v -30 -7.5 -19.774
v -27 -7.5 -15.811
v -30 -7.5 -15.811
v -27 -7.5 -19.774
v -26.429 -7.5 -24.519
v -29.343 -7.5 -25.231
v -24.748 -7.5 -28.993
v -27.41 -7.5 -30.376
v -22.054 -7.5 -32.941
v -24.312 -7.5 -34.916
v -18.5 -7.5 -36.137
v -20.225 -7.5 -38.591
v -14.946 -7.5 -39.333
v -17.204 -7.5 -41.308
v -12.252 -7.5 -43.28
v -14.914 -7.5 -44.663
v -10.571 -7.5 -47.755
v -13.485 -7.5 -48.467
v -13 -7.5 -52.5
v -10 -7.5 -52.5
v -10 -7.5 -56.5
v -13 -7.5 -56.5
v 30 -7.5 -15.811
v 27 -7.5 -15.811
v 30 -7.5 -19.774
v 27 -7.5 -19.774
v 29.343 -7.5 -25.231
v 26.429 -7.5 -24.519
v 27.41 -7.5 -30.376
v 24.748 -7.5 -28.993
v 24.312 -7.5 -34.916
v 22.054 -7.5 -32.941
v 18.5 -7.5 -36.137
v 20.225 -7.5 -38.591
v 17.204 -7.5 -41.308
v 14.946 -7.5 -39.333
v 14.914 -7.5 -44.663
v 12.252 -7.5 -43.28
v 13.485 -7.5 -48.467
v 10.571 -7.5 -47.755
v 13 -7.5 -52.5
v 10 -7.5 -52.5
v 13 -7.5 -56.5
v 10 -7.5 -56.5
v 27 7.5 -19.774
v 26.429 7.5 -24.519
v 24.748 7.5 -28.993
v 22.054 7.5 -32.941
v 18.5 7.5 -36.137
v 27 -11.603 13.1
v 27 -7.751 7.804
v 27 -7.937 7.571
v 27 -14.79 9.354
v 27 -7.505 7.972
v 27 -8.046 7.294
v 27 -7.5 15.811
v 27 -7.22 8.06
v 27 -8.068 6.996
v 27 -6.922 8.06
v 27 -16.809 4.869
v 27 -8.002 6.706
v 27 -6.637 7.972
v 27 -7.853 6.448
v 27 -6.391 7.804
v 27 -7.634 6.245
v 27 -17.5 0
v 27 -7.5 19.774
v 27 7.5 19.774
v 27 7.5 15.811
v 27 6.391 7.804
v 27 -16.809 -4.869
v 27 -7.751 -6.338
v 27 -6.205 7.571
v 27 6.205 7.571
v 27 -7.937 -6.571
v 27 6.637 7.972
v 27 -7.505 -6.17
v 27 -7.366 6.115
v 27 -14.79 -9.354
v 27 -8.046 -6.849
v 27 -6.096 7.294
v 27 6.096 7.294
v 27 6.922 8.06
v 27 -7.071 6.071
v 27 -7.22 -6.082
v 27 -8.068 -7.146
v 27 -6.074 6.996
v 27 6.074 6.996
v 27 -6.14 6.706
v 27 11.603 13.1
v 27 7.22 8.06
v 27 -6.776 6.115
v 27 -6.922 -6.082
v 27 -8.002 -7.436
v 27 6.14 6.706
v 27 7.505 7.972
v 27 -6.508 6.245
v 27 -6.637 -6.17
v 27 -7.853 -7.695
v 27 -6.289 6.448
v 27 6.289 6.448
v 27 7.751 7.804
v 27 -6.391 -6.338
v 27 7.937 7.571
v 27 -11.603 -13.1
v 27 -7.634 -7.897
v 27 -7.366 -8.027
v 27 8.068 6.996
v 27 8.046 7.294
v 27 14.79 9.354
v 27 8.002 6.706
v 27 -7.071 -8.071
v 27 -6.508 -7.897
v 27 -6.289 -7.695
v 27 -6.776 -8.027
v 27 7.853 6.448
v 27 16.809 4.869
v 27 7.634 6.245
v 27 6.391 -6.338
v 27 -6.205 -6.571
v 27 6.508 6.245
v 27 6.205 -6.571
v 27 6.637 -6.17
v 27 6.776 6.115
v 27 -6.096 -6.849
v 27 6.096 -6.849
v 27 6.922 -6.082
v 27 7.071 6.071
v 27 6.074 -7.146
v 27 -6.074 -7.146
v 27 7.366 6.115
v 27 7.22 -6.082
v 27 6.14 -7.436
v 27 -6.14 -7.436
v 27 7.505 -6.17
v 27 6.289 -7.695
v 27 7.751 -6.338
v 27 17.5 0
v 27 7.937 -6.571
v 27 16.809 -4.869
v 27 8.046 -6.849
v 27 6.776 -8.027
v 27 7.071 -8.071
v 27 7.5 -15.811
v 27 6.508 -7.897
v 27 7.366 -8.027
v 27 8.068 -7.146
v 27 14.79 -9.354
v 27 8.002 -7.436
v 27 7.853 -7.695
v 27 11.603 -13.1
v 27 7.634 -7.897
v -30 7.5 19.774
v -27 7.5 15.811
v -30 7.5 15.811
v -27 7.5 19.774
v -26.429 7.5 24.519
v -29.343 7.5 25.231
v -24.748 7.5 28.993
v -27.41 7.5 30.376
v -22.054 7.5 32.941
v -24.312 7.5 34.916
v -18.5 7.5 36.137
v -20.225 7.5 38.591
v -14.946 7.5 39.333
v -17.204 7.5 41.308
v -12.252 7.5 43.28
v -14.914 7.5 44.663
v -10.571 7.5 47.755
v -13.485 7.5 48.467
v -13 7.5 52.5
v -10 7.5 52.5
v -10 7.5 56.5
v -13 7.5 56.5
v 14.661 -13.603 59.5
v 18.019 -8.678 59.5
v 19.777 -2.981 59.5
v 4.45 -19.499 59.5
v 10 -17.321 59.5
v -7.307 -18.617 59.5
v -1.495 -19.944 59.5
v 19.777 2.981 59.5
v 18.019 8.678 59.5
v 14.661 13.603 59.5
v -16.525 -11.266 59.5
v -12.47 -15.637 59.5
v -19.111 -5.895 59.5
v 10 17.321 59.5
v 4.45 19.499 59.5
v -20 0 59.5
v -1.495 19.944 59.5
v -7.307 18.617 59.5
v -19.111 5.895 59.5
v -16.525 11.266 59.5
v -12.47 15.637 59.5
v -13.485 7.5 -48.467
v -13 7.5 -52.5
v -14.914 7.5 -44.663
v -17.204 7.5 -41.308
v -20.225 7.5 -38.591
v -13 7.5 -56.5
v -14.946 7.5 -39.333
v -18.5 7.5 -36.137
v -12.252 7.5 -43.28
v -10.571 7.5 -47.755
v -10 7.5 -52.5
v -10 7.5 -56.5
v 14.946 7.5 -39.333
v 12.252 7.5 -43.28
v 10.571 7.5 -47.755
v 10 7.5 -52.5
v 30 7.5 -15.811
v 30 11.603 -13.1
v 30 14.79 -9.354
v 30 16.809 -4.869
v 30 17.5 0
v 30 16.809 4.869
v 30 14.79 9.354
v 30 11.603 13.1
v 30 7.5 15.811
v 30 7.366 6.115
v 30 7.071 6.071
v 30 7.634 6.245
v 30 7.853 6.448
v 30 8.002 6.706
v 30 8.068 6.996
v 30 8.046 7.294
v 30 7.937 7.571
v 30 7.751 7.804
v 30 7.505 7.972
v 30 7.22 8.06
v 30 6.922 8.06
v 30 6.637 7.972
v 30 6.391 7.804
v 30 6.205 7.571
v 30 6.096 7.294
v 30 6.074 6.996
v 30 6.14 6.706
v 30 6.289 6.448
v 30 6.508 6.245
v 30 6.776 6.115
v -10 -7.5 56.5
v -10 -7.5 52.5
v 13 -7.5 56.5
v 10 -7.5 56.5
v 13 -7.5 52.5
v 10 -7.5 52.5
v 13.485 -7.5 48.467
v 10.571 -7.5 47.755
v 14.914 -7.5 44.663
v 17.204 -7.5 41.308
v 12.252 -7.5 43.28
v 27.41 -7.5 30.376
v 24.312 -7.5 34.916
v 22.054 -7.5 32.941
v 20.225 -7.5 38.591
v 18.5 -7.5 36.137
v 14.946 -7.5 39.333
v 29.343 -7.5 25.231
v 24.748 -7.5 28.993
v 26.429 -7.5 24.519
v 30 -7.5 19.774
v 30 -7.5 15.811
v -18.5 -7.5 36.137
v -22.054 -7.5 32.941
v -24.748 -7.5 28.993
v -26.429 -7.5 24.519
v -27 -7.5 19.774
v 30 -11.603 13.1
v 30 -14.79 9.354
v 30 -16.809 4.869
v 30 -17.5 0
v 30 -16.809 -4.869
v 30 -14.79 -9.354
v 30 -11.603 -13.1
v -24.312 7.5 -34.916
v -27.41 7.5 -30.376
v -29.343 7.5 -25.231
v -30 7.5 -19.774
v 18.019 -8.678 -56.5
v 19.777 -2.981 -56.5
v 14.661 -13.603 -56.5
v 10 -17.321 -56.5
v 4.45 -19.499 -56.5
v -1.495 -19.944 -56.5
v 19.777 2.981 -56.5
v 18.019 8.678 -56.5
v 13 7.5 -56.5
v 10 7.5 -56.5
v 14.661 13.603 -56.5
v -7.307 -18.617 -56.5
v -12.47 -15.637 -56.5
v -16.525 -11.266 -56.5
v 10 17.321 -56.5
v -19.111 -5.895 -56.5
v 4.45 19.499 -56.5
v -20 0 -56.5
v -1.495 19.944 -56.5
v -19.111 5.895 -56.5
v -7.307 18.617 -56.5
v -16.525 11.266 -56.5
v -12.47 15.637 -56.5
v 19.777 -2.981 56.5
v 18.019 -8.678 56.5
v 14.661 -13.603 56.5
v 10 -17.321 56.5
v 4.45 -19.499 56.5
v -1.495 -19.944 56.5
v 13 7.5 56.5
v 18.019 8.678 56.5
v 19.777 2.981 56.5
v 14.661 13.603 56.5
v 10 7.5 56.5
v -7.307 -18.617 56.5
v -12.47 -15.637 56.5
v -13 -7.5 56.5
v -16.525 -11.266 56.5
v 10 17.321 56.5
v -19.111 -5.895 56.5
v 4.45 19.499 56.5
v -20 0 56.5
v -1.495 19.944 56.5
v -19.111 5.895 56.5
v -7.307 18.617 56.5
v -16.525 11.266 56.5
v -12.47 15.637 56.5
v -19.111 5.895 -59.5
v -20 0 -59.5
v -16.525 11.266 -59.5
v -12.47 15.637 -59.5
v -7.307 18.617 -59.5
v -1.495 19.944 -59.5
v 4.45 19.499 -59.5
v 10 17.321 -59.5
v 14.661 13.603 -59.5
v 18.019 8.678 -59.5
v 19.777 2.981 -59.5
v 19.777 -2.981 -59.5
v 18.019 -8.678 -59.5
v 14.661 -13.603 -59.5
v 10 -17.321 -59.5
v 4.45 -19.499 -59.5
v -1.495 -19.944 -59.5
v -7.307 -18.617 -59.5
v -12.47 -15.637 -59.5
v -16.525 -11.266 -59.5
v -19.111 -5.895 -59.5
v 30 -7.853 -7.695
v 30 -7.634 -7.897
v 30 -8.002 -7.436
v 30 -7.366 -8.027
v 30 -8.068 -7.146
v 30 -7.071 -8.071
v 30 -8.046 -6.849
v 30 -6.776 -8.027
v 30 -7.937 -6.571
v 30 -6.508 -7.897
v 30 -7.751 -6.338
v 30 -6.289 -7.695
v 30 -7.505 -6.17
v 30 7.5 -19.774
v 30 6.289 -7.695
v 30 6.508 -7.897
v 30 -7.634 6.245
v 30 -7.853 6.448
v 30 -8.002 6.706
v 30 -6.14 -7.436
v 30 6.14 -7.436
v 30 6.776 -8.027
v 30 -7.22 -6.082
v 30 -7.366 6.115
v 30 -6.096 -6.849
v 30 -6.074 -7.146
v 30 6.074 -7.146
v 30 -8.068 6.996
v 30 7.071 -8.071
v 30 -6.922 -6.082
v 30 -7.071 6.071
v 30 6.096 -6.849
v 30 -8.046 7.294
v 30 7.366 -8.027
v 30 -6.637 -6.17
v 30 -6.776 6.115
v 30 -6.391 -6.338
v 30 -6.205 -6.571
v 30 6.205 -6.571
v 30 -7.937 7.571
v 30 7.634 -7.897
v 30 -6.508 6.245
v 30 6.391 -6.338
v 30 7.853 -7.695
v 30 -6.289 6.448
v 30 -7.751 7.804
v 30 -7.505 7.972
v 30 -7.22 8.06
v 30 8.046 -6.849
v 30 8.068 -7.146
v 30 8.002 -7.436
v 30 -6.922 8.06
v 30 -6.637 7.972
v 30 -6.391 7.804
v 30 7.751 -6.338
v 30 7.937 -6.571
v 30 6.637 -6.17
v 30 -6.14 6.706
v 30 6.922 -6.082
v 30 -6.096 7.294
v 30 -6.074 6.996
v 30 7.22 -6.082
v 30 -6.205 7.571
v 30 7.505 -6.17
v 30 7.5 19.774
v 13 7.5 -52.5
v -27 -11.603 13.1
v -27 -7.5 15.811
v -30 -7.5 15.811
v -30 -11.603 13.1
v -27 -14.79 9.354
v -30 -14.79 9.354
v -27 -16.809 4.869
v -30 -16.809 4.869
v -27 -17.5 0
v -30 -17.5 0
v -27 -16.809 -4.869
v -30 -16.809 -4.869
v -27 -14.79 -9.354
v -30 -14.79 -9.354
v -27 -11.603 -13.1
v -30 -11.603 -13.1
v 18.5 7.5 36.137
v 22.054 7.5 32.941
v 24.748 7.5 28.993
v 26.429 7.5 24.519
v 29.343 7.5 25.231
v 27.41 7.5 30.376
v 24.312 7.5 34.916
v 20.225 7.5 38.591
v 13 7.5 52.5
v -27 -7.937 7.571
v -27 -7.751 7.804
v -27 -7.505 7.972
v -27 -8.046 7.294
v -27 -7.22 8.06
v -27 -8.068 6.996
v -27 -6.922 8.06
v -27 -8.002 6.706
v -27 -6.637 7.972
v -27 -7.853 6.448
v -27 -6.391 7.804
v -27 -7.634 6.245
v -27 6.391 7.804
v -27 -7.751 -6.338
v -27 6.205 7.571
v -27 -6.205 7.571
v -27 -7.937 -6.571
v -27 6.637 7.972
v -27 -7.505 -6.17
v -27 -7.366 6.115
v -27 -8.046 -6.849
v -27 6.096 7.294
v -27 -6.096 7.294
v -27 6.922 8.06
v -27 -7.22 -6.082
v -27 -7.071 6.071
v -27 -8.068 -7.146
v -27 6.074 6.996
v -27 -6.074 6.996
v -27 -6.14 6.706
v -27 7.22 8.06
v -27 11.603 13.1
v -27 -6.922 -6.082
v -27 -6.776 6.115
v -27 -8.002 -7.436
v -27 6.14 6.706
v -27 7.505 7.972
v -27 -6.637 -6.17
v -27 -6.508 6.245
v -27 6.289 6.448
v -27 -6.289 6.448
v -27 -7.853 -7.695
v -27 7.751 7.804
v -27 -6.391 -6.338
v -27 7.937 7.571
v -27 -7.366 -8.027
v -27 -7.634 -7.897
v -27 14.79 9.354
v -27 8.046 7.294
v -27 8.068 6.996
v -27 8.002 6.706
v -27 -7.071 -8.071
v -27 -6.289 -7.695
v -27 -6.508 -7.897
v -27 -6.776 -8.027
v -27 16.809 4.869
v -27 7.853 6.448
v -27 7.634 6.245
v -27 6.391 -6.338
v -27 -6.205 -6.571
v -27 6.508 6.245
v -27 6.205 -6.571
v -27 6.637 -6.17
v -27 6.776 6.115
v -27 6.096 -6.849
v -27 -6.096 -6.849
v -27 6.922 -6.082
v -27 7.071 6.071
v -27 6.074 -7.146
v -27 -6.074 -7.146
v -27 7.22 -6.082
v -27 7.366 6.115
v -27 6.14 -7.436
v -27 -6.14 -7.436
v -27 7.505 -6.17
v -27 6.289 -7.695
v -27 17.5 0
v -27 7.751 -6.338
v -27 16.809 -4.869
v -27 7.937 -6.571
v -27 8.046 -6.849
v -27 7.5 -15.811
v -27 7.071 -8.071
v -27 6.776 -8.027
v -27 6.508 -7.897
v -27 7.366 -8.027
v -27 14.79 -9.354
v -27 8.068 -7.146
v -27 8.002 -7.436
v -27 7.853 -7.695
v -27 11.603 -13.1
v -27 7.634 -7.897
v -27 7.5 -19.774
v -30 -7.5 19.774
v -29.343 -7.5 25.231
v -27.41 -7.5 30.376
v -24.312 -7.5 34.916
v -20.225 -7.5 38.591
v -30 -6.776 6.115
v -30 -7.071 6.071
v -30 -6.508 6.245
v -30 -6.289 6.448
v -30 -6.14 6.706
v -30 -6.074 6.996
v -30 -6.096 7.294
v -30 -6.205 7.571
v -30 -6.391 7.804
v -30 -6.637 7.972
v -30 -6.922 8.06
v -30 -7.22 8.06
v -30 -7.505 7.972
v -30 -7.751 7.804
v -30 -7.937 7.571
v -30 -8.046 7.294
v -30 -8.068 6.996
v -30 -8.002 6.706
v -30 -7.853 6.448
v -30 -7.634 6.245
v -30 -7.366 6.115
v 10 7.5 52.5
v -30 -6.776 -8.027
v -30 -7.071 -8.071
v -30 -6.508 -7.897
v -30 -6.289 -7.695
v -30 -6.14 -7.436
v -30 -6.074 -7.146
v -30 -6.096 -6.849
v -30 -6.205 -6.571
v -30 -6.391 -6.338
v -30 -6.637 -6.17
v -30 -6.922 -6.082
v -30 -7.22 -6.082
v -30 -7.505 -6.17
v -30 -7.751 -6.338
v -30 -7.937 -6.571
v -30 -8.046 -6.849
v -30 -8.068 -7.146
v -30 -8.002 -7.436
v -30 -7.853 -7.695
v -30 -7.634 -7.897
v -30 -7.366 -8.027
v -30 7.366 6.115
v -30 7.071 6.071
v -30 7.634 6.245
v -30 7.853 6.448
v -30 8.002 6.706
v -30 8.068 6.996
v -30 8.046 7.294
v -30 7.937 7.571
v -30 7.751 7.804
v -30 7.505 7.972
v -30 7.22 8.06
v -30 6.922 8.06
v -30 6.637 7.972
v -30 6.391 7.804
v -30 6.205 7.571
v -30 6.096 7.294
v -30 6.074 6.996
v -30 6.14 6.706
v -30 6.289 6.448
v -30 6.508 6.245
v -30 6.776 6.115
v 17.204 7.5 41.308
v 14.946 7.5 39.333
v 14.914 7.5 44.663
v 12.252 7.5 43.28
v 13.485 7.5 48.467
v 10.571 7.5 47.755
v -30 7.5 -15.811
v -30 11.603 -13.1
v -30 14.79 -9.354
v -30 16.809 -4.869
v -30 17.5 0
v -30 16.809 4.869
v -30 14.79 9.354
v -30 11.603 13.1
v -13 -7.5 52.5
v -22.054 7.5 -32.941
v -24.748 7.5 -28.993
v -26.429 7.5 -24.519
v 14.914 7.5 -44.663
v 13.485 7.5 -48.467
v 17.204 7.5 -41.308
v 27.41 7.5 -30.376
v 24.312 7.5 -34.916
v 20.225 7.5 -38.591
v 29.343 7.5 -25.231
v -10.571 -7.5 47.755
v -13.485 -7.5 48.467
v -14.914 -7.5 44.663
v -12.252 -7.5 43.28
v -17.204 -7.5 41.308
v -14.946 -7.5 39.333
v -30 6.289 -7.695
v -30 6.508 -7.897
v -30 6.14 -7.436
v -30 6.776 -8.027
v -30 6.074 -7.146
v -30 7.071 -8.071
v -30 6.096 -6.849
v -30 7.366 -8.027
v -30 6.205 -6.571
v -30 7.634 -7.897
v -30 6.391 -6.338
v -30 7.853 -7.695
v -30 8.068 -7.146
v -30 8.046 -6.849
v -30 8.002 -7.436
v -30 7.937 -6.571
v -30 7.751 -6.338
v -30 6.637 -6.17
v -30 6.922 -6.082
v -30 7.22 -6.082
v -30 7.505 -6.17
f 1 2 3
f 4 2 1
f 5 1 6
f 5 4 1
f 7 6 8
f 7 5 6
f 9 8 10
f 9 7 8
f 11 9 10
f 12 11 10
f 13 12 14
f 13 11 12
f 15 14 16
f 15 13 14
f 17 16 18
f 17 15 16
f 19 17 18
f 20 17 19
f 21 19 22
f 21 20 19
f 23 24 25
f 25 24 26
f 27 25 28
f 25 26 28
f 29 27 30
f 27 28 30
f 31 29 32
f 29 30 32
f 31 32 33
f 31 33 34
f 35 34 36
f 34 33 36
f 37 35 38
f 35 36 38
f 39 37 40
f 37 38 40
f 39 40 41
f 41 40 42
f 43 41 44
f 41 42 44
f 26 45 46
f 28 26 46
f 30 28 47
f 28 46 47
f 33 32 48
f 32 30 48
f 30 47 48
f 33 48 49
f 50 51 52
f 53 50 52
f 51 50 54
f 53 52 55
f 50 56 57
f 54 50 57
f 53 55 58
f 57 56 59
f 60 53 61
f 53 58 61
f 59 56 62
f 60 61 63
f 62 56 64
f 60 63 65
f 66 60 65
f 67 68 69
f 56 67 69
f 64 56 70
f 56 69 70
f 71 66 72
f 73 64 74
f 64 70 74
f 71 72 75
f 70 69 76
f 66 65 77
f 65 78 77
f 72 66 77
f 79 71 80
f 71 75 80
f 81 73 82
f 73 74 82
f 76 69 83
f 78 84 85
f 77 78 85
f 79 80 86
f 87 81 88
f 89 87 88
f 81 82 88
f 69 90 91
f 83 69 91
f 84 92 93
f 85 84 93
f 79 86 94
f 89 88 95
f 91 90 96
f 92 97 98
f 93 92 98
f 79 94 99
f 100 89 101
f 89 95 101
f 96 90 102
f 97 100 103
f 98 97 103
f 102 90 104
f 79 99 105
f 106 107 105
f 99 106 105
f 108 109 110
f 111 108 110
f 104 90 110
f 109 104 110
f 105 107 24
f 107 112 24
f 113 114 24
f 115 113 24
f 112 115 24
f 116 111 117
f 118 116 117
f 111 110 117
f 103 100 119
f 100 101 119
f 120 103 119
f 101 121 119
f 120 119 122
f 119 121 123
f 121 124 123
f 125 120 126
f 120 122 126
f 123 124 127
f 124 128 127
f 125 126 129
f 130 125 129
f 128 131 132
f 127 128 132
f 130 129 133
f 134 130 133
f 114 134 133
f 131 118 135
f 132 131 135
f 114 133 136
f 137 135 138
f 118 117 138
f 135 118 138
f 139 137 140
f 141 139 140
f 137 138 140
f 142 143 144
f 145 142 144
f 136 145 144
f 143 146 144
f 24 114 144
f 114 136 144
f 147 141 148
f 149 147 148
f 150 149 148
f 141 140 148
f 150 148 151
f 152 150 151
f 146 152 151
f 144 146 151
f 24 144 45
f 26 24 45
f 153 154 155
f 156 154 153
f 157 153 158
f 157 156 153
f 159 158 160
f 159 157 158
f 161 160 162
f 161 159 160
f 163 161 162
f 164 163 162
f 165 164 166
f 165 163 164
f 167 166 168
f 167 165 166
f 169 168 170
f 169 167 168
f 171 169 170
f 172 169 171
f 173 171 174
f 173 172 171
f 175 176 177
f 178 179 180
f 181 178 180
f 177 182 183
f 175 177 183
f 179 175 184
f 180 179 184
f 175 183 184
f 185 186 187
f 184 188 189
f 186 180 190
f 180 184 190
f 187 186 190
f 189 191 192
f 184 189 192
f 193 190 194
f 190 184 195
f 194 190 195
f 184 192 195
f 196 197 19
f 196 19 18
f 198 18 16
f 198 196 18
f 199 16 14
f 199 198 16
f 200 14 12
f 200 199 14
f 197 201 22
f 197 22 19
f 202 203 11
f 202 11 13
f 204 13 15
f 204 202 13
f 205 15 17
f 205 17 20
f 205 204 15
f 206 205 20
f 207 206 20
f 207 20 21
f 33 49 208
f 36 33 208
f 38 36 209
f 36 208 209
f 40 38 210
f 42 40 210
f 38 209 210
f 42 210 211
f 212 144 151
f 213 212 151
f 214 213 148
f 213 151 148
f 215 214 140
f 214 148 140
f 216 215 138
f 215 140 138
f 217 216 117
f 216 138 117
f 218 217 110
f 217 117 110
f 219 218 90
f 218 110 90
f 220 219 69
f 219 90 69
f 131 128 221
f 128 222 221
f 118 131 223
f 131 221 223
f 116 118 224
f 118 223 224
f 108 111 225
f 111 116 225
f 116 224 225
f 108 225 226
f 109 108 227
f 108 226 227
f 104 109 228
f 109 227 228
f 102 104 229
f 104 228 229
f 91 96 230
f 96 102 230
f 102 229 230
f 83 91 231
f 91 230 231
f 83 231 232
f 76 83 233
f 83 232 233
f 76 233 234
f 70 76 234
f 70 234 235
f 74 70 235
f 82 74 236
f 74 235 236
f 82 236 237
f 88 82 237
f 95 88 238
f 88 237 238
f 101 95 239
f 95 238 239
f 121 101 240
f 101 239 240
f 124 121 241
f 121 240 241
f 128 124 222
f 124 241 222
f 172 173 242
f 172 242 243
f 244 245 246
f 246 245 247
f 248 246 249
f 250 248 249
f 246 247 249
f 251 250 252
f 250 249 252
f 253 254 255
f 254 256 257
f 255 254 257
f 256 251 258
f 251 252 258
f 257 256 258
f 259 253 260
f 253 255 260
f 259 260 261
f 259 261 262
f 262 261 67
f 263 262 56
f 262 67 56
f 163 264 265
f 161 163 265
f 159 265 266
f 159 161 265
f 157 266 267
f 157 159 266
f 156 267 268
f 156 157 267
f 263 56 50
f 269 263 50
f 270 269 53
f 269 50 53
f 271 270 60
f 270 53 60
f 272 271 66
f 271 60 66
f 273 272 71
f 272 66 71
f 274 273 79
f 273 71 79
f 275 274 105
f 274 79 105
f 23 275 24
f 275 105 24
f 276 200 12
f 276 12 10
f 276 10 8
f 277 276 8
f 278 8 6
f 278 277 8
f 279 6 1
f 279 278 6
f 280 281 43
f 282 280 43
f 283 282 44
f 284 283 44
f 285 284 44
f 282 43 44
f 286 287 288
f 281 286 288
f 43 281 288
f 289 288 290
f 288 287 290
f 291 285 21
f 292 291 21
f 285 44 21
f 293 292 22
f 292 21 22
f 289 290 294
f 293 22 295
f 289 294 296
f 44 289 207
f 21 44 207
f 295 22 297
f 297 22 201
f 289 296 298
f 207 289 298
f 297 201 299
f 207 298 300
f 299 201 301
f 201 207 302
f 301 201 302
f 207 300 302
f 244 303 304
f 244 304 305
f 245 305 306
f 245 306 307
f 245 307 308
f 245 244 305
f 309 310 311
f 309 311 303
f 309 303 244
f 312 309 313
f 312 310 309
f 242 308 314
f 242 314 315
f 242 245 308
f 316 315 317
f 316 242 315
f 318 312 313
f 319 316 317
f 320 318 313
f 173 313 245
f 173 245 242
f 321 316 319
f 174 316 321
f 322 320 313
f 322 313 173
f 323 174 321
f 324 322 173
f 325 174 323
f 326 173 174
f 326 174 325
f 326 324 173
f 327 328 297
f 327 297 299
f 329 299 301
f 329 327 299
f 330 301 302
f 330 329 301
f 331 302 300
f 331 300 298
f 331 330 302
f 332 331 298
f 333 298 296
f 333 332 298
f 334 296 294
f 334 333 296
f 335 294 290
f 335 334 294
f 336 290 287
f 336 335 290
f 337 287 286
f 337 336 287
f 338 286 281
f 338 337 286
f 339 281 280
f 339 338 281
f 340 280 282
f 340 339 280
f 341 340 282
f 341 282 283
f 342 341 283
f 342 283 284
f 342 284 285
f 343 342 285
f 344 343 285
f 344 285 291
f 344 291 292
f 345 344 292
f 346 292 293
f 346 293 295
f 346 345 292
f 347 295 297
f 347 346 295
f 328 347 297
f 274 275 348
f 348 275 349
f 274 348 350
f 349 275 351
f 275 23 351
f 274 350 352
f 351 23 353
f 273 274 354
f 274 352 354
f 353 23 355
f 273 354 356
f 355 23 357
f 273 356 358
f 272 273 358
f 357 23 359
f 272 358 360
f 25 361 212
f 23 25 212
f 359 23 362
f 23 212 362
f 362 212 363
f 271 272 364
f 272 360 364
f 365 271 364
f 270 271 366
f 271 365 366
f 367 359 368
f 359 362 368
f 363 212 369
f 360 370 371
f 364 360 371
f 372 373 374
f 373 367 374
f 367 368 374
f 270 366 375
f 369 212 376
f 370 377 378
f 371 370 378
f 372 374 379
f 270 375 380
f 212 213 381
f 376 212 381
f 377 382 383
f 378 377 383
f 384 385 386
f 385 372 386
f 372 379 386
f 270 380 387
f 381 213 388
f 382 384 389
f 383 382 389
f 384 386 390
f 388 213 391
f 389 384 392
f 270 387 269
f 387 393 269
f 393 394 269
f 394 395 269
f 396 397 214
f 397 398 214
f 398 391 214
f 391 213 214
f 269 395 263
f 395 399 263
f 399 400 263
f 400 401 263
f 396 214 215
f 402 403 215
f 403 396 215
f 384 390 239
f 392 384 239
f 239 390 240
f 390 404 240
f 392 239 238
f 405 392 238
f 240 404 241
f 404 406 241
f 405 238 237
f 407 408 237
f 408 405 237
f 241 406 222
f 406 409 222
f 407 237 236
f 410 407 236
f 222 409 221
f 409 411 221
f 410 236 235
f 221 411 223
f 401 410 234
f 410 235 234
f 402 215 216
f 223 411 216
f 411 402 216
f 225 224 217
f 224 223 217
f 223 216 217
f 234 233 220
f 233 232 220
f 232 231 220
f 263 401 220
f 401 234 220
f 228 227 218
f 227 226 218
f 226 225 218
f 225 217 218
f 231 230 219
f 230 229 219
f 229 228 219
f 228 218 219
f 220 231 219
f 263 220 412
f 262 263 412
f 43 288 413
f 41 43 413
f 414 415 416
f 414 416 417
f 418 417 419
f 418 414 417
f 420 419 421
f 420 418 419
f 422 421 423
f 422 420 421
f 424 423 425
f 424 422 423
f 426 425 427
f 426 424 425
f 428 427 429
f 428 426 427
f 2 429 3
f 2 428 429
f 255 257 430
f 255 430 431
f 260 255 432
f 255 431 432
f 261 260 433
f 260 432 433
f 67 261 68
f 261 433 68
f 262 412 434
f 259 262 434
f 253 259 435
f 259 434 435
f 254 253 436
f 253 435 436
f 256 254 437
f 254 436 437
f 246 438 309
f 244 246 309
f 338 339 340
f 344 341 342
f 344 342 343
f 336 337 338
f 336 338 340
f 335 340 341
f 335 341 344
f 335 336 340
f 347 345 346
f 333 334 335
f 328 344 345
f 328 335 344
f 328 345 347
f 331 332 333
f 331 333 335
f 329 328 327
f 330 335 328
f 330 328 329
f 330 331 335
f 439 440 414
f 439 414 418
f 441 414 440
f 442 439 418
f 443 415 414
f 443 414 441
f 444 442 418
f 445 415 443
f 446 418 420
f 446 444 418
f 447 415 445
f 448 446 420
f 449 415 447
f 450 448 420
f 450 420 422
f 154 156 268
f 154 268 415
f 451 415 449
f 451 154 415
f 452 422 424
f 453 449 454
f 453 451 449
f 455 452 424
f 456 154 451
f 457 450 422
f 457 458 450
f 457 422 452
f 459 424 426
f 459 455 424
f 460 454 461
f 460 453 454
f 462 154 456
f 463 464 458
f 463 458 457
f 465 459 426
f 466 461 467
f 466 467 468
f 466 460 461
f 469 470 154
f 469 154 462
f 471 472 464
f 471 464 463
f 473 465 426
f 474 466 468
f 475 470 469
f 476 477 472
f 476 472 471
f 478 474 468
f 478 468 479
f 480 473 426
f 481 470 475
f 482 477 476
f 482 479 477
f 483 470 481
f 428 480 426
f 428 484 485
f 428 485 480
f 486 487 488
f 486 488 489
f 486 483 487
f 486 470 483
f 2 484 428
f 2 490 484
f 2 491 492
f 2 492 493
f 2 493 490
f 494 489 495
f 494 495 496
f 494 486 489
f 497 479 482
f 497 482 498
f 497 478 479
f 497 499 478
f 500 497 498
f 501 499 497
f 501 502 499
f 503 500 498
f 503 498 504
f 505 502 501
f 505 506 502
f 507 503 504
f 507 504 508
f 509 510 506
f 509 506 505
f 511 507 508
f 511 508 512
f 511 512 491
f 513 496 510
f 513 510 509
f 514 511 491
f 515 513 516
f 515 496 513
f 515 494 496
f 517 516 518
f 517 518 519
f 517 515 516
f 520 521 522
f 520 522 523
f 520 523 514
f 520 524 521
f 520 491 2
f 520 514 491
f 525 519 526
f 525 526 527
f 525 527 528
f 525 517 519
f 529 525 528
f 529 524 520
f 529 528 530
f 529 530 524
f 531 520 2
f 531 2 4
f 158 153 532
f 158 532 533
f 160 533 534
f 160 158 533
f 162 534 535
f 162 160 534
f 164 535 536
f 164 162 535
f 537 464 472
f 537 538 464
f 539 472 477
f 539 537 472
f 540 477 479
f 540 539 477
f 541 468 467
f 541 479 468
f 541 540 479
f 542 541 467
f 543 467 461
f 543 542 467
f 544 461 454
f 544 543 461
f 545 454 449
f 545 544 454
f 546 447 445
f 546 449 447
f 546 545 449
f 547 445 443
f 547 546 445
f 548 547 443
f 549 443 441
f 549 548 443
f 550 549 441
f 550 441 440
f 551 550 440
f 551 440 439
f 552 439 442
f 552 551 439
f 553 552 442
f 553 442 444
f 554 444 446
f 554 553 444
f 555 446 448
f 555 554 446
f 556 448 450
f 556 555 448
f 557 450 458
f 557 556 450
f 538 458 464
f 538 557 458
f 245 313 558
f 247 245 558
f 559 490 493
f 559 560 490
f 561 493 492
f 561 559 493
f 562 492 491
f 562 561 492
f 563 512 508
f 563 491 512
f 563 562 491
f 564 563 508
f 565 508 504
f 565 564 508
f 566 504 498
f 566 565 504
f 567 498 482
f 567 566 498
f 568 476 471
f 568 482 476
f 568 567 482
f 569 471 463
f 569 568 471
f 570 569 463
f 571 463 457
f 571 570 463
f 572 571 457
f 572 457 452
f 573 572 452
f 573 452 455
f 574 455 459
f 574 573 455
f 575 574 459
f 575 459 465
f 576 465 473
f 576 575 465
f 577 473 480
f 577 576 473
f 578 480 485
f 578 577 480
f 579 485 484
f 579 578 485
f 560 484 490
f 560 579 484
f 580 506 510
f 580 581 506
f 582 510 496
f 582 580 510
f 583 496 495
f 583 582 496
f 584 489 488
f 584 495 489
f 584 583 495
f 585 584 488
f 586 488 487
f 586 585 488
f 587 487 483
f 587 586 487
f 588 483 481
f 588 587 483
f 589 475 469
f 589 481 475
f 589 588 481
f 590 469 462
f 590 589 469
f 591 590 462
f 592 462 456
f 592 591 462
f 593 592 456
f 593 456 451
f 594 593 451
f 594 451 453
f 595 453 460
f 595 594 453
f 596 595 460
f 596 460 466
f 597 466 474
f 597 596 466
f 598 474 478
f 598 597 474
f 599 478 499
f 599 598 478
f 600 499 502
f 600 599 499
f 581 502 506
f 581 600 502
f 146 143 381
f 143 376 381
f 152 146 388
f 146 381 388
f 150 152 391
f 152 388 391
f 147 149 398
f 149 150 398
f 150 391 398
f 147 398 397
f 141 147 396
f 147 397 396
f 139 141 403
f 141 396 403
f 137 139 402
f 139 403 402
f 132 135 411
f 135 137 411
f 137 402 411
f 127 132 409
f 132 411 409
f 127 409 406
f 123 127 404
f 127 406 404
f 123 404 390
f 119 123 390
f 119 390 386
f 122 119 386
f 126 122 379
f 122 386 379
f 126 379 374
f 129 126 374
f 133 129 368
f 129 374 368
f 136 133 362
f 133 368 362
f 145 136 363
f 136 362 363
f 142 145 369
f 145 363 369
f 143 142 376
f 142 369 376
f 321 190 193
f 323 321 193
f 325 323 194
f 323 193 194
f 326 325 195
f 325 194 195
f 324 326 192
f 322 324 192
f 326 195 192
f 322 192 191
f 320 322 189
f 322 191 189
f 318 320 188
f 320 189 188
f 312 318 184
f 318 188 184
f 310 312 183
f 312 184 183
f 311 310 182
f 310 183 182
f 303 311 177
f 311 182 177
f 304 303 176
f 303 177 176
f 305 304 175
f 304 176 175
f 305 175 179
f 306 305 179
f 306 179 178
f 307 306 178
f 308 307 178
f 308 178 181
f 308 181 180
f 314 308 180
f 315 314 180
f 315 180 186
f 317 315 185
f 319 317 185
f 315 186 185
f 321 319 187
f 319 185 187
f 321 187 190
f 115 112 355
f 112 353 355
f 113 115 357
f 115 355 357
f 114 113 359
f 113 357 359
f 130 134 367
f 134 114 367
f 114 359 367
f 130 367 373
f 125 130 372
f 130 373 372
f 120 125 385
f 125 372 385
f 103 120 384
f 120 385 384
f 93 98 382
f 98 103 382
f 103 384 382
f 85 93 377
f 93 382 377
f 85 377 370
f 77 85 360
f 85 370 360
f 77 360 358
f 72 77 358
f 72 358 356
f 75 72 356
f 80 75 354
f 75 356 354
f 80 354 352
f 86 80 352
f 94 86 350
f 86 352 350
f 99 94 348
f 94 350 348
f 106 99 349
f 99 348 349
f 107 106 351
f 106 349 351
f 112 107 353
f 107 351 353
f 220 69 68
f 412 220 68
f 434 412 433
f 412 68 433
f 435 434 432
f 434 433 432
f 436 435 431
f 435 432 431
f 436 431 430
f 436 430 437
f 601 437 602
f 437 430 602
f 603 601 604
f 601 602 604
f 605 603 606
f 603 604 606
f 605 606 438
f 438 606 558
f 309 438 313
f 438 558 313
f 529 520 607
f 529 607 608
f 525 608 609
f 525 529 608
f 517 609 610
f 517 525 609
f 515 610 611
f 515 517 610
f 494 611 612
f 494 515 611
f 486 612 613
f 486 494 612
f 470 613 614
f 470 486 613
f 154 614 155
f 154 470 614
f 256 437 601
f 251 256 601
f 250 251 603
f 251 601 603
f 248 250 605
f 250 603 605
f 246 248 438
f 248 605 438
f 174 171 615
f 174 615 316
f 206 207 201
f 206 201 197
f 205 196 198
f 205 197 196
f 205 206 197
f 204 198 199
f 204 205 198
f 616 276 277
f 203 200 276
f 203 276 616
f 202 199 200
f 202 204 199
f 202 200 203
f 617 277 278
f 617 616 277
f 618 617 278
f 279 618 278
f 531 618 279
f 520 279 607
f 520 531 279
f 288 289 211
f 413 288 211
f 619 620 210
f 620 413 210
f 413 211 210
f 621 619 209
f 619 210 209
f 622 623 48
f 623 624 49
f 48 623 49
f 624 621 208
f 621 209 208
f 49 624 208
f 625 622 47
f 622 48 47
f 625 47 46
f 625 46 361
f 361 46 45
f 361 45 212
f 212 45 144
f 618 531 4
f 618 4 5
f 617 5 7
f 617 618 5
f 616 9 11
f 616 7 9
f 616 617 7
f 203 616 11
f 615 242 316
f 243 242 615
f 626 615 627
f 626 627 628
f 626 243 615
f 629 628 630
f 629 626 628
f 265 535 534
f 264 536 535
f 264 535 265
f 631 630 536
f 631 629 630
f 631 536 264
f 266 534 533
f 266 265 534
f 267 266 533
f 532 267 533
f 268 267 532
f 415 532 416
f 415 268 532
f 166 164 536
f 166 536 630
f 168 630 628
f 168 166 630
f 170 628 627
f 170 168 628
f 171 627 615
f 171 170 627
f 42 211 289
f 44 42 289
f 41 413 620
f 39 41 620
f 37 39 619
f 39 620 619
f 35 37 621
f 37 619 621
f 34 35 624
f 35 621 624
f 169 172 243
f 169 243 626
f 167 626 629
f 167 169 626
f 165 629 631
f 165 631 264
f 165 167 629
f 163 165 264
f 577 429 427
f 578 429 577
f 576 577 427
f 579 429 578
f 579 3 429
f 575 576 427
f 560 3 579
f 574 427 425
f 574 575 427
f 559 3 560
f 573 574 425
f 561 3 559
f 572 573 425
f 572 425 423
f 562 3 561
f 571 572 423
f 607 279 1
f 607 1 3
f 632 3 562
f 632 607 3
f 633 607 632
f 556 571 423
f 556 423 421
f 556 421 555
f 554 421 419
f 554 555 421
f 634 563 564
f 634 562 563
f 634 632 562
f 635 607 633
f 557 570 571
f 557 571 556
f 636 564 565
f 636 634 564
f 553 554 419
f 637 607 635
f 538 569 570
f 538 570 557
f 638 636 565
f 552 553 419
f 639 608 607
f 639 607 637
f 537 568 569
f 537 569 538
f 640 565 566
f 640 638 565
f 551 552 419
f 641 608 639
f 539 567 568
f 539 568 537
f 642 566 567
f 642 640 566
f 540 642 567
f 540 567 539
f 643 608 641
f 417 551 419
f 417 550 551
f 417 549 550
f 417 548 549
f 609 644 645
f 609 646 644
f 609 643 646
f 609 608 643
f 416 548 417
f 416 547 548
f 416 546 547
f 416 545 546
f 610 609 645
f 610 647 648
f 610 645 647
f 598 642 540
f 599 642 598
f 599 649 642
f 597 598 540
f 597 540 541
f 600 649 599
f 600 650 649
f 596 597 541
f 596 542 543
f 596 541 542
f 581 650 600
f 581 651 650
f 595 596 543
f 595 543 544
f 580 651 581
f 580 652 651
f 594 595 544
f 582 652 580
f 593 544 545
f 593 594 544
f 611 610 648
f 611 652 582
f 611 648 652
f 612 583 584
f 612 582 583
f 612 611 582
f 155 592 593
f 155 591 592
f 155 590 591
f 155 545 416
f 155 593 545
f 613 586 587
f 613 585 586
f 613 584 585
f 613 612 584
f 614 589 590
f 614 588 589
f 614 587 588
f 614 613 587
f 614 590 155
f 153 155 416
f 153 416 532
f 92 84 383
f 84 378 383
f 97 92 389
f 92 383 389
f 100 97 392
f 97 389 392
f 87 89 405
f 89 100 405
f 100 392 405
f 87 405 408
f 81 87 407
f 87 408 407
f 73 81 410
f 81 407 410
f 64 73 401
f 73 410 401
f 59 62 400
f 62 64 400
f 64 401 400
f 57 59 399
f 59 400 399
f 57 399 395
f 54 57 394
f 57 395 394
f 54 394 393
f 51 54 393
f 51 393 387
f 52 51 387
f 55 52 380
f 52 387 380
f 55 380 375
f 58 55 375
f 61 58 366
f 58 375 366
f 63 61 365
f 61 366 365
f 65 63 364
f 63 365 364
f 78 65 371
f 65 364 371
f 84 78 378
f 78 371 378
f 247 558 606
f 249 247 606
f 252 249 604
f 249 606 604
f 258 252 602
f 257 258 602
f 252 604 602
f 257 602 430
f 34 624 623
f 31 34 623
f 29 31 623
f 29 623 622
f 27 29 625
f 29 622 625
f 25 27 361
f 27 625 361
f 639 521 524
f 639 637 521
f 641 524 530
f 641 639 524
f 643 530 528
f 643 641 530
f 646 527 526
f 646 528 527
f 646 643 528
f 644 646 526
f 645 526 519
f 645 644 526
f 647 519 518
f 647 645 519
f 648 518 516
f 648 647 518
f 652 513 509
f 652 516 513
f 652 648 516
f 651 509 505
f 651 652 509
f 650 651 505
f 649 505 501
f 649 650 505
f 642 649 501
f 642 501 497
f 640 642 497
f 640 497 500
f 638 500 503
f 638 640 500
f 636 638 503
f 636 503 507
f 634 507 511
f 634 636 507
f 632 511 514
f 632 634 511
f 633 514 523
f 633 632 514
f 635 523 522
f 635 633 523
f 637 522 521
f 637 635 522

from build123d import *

# Parameters (mm, degrees)
BOSS_EXTRUDE1_DEPTH = 25
SKETCH2_R           = 1
BOSS_EXTRUDE2_DEPTH = 25
SKETCH3_R           = 20
BOSS_EXTRUDE3_DEPTH = 3


with BuildPart() as part:
    # Sketch1 → Boss-Extrude1 (new, symmetric)
    with BuildSketch(Plane(origin=(0, 0, 0), x_dir=(1, 0, 0), z_dir=(0, 1, 0))):
        with BuildLine():
            Line((-27, -19.773863656), (-27, 19.773863656))
            ThreePointArc((-27, 19.773863656), (-24.748239349, 28.993408113), (-18.5, 36.136931828))
            ThreePointArc((-18.5, 36.136931828), (-12.251760651, 43.280455543), (-10, 52.5))
            Line((-10, 52.5), (-10, 59.5))
            Line((-10, 59.5), (-13, 59.5))
            Line((-13, 59.5), (-13, 52.5))
            ThreePointArc((-13, 52.5), (-14.913996553, 44.663387211), (-20.225, 38.591392054))
            ThreePointArc((-20.225, 38.591392054), (-27.410475252, 30.376339782), (-30, 19.773863656))
            Line((-30, 19.773863656), (-30, -19.773863656))
            ThreePointArc((-30, -19.773863656), (-27.410475252, -30.376339782), (-20.225, -38.591392054))
            ThreePointArc((-20.225, -38.591392054), (-14.913996553, -44.663387211), (-13, -52.5))
            Line((-13, -52.5), (-13, -59.5))
            Line((-13, -59.5), (-10, -59.5))
            Line((-10, -59.5), (-10, -52.5))
            ThreePointArc((-10, -52.5), (-12.251760651, -43.280455543), (-18.5, -36.136931828))
            ThreePointArc((-18.5, -36.136931828), (-24.748239349, -28.993408113), (-27, -19.773863656))
        make_face()
    extrude(amount=BOSS_EXTRUDE1_DEPTH, both=True)


with BuildPart() as body_2:
    # Sketch2 → Boss-Extrude2 (new, symmetric)
    with BuildSketch(Plane(origin=(-27, 0, 0), x_dir=(0, 0, -1), z_dir=(1, 0, 0))):
        with BuildLine():
            Line((15.811388301, -7.5), (59.5, -7.5))
            Line((59.5, -7.5), (59.5, 7.5))
            Line((59.5, 7.5), (15.811388301, 7.5))
            ThreePointArc((15.811388301, 7.5), (0, 17.5), (-15.811388301, 7.5))
            Line((-15.811388301, 7.5), (-59.5, 7.5))
            Line((-59.5, 7.5), (-59.5, -7.5))
            Line((-59.5, -7.5), (-15.811388301, -7.5))
            ThreePointArc((-15.811388301, -7.5), (0, -17.5), (15.811388301, -7.5))
        make_face()
        with Locations((7.071067812, -7.071067812)):
            Circle(SKETCH2_R, mode=Mode.SUBTRACT)
        with Locations((-7.071067812, -7.071067812)):
            Circle(SKETCH2_R, mode=Mode.SUBTRACT)
        with Locations((-7.071067812, 7.071067812)):
            Circle(SKETCH2_R, mode=Mode.SUBTRACT)
        with Locations((7.071067812, 7.071067812)):
            Circle(SKETCH2_R, mode=Mode.SUBTRACT)
    extrude(amount=BOSS_EXTRUDE2_DEPTH, both=True)

    # Combine1: intersect part
    add(part.part, mode=Mode.INTERSECT)


with BuildPart() as body_2_2:
    # Mirror3: mirrored copy
    add(body_2.part.mirror(Plane(origin=(0, 0, 0), x_dir=(0, 0, 1), z_dir=(1, 0, 0))))


with BuildPart() as body_2_1:
    add(body_2.part)

    add(body_2_2.part)  # Boss-Extrude3 merges body 2 2
    # Sketch3 → Boss-Extrude3 (add)
    with BuildSketch(Plane(origin=(0, 0, -59.5), x_dir=(-1, 0, 0), z_dir=(0, 0, -1))):
        Circle(SKETCH3_R)
    boss_extrude3 = extrude(amount=-BOSS_EXTRUDE3_DEPTH)

    # Mirror4: Boss-Extrude3 across plane
    add(boss_extrude3.mirror(Plane.XY))


solid = body_2_1.part
